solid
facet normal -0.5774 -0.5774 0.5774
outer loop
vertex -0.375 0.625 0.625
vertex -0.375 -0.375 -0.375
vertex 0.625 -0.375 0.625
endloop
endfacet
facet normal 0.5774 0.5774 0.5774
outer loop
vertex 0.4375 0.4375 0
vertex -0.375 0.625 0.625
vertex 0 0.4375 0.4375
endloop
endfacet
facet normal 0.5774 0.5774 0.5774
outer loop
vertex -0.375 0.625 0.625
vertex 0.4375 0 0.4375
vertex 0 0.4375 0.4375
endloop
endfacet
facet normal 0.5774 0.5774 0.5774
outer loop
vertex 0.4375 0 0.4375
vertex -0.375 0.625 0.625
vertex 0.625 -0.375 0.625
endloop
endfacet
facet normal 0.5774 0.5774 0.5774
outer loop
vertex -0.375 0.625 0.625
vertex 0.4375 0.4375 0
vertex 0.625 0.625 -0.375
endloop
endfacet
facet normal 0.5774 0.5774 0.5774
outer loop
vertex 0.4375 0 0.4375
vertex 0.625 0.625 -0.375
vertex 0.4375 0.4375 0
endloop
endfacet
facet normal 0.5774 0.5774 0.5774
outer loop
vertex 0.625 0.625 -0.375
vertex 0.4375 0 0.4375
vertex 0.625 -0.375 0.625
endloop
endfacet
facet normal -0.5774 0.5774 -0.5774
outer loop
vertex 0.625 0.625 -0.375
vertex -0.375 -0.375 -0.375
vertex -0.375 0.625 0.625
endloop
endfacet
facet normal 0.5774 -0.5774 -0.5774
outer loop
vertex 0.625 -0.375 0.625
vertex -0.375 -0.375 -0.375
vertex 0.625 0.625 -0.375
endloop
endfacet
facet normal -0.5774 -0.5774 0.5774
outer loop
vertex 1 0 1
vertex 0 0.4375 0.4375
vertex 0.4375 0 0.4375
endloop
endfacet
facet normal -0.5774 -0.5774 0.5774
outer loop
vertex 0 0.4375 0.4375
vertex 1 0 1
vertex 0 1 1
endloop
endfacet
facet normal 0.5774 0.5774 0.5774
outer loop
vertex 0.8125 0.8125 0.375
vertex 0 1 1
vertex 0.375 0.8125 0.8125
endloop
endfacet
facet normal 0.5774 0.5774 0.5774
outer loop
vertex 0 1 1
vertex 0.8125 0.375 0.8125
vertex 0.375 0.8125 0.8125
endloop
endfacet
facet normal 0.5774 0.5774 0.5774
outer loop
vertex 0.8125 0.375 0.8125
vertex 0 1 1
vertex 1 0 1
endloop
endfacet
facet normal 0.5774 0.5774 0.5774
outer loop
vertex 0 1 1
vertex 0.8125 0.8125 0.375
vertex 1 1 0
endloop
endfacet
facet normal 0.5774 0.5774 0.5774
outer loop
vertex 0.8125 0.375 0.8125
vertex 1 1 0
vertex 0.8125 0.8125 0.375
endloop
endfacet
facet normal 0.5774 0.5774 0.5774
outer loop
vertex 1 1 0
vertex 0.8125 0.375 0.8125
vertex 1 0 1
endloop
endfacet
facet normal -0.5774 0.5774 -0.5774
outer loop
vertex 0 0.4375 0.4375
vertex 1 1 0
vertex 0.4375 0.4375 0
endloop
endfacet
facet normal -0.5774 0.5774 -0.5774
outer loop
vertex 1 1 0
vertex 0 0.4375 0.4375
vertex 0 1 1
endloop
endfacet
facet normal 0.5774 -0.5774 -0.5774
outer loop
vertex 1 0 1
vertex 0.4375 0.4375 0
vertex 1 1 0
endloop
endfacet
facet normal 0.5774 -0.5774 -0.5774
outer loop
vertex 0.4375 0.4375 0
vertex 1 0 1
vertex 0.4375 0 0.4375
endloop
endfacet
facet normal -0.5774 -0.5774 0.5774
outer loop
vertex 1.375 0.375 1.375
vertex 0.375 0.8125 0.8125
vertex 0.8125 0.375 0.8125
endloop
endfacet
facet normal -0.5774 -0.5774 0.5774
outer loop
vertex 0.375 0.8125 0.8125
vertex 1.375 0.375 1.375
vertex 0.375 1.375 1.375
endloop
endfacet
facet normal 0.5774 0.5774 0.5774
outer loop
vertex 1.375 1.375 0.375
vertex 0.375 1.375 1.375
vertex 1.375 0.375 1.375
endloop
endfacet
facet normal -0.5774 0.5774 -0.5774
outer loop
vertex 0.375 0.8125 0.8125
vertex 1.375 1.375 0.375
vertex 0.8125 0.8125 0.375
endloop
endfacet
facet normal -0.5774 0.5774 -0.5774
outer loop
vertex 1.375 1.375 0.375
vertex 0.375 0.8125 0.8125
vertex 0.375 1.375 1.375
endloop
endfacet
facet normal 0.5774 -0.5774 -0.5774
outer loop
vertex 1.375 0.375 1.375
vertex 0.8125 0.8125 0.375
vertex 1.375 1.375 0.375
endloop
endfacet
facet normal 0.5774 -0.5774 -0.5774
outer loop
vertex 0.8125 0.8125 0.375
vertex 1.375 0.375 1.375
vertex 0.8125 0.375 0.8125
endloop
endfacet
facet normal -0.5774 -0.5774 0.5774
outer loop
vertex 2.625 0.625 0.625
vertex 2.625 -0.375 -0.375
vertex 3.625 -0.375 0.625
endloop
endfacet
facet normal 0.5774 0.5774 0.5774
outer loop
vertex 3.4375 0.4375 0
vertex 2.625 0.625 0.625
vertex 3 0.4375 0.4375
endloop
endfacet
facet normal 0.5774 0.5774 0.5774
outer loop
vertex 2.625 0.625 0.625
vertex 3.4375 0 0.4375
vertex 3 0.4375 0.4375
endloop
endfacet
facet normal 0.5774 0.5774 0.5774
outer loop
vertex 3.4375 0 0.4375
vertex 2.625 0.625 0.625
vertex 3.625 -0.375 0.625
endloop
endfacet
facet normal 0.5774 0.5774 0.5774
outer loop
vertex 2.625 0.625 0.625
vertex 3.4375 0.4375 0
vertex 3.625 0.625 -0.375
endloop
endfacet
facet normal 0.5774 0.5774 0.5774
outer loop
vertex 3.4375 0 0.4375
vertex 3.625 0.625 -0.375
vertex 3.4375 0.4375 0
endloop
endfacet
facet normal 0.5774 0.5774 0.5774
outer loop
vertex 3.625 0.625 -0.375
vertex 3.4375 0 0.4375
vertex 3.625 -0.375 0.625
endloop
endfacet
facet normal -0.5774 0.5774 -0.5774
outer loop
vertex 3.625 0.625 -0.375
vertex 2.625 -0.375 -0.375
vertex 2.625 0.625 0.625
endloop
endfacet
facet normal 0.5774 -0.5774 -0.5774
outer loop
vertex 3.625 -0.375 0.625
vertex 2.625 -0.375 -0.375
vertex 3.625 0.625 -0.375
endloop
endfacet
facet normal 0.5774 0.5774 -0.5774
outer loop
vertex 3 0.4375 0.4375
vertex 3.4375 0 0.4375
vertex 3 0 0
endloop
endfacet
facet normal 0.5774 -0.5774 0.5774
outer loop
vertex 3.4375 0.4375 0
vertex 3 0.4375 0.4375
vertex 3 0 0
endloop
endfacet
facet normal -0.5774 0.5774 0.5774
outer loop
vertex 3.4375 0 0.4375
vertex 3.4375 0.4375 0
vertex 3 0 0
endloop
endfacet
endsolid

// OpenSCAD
// file: common.scad
module layout(rows=1, scale=2) {
    for (child = [0:$children-1]) {
        x = floor(child / rows);
        y = child % rows;
        translate([x*scale, y*scale, 0]) children(child);
    }
}

// Avoid non-triangular faces (i.e. squares on a cube).
// Those can be triangulated in multiple ways, which makes
// comparison against a reference object harder.
module tetra() {
    polyhedron(
        [[0, 0, 0], [0, 1, 1], [1, 0, 1], [1, 1, 0]],
        [[0, 1, 2], [0, 2, 3], [0, 3, 1], [1, 3, 2]]
    );
}

tetra();
// main file
use <common.scad>

// Boolean operations "difference" and "intersection" with multiple colors have other results than shown in the "F5" preview, so they are best avoided.
// The behavior is of course explainable: each color is rendered independently (with all other colors removed), and the final results are unioned together.
layout(scale=3) {
    v = 3/8 * [1, 1, 1];

    // Union works normal, although the resulting model has overlapping colors
    union() {
        color("red") translate(-v) tetra();
        color("green") tetra();
        color("blue") translate(v) tetra();
    }

    // One full red tetra results:
    // - for color red, a tetra minus two empty volumes is a tetra
    // - for other colors, an empty volume minus something else is empty
    difference() {
        color("red") translate(-v) tetra();
        color("green") tetra();
        color("blue") translate(v) tetra();
    }

    // The result is empty: there are always two empty volumes, and intersection with an empty volume is empty
    intersection() {
        color("red") translate(-v) tetra();
        color("green") tetra();
        color("blue") translate(v) tetra();
    }
}
